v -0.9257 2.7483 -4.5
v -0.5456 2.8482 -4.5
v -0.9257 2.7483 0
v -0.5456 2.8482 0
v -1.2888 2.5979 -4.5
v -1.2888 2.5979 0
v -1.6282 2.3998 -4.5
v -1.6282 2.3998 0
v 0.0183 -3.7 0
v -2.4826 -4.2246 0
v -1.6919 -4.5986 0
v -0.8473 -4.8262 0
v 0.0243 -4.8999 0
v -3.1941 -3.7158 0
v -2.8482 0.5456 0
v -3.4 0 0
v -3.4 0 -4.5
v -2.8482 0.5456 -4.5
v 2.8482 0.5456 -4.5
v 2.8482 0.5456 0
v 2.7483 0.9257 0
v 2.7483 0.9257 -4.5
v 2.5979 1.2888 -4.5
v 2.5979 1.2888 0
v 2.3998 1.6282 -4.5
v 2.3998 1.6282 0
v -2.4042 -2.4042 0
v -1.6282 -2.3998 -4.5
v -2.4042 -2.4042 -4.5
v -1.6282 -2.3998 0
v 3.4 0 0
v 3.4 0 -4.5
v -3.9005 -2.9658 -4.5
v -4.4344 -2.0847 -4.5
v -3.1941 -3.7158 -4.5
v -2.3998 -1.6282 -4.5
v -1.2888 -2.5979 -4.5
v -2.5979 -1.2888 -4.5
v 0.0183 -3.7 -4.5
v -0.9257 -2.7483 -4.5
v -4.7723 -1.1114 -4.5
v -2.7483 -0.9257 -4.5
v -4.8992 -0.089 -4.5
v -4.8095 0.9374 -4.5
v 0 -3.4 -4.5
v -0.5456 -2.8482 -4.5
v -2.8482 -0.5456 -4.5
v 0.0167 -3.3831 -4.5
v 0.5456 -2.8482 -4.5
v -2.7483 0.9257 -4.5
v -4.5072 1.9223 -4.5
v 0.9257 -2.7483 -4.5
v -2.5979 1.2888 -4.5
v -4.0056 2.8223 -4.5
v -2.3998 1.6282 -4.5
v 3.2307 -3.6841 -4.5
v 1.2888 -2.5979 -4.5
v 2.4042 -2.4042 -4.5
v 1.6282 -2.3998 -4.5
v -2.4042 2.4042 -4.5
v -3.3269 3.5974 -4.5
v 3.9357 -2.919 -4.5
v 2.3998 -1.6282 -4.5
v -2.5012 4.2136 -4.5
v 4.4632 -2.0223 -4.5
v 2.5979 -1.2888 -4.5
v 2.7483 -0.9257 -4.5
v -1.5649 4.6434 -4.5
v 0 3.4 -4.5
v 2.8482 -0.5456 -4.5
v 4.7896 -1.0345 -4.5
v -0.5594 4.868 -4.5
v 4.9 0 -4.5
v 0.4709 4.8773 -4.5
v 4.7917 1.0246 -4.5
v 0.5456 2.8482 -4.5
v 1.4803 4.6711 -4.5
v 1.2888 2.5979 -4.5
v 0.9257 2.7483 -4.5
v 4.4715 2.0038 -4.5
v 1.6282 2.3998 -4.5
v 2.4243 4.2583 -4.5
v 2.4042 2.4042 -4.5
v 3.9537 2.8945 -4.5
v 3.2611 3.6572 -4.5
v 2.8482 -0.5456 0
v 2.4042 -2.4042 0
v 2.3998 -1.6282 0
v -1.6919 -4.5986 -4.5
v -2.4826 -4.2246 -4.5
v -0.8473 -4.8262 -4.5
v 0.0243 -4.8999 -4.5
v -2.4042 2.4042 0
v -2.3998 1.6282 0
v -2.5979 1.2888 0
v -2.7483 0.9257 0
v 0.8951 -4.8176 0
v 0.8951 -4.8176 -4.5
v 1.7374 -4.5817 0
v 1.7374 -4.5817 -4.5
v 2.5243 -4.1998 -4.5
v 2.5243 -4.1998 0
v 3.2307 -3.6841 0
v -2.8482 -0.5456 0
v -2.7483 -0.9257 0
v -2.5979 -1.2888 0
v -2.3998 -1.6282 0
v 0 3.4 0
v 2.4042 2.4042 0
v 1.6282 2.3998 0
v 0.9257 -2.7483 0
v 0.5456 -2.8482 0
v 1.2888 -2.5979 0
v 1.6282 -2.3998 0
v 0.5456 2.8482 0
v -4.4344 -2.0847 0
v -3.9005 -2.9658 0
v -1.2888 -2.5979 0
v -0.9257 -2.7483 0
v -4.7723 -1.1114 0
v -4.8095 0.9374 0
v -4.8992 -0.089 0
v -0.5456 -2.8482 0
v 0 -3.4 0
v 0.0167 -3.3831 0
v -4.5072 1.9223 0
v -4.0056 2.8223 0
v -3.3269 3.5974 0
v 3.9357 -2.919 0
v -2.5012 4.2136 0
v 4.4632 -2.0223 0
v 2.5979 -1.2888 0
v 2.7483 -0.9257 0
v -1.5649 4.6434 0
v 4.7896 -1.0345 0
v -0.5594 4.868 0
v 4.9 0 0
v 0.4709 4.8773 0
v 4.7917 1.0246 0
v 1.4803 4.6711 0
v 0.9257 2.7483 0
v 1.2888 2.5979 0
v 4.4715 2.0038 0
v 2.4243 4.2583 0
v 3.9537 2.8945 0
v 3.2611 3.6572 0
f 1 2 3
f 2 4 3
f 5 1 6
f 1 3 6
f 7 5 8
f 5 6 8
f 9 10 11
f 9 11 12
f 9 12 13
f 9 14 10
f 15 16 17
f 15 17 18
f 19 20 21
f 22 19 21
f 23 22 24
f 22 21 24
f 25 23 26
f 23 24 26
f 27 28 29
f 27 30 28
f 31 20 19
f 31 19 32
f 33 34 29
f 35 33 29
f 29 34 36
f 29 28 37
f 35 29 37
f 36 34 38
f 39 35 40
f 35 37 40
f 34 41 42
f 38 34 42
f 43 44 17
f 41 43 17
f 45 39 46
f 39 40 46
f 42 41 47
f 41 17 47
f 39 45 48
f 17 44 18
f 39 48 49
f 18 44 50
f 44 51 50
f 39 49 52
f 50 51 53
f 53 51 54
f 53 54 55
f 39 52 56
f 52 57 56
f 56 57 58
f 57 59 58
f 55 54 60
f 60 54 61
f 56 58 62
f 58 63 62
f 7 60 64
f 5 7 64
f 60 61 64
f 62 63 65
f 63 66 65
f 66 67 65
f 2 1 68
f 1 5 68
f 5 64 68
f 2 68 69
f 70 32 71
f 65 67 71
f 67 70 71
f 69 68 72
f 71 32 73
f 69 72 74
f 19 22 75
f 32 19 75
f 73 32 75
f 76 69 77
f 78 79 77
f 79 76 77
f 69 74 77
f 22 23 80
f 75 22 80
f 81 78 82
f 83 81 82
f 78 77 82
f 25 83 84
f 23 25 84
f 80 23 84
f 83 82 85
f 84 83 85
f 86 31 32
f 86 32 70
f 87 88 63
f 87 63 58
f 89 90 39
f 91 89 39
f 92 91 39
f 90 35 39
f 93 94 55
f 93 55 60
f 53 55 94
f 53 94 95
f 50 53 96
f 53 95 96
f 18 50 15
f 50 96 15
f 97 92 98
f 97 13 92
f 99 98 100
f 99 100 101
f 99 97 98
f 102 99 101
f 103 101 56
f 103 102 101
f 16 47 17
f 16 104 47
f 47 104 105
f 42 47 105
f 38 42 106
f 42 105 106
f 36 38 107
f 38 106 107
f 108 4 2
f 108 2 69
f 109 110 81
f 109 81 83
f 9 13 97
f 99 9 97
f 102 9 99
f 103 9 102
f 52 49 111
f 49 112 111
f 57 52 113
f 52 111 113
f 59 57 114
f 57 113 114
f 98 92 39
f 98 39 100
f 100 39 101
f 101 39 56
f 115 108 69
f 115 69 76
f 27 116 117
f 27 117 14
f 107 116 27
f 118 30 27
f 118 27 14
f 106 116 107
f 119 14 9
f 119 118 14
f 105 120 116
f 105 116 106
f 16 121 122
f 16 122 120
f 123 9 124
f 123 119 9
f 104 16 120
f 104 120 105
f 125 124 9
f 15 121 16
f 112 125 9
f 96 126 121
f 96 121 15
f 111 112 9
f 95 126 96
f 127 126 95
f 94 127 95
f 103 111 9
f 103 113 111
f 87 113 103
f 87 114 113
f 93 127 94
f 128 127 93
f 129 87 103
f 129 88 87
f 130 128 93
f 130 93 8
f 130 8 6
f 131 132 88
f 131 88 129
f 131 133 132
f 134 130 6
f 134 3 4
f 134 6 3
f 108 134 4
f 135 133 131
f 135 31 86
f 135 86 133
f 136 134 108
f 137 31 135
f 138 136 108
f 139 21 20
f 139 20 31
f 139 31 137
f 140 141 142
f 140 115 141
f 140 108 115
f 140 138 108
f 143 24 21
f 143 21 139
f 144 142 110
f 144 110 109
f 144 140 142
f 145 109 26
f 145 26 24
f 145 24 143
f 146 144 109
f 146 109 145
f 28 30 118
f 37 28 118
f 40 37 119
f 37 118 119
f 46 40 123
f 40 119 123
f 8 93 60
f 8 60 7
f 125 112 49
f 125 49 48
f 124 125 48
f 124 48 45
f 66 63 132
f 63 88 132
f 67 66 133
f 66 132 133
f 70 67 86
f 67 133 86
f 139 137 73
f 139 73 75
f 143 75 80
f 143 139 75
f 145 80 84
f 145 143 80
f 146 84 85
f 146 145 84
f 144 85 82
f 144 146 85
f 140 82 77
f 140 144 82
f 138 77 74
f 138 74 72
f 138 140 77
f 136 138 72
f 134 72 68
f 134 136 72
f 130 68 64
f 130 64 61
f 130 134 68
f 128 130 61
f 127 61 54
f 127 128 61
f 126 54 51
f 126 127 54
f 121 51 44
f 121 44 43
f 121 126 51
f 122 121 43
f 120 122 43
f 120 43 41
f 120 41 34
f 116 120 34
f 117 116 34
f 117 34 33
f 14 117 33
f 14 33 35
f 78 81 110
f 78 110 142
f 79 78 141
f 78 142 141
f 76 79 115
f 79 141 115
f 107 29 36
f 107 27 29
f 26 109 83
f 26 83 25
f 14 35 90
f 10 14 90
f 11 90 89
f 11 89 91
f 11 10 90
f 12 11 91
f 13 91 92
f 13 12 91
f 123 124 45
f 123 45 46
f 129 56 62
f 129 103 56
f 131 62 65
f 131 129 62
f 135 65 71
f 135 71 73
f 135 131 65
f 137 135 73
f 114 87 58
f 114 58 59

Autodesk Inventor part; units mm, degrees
ref_plane "YZ Plane" through (0, 0, 0) normal (1, 0, 0) x (0, 1, 0)
ref_plane "XZ Plane" through (0, 0, 0) normal (0, 1, 0) x (-1, 0, 0)
sketch "Sketch1" plane through (0, 0, 0) normal (0, 0, 1) x (1, 0, 0)
  line L0 (-2.3998, 1.6282) -> (-2.4042, 2.4042) projected
  arc A0 (-2.3998, 1.6282) -> (-2.8482, 0.5456) centre (0, 0) ccw projected
  line L1 (-3.4, 0) -> (-2.8482, 0.5456) projected
  line L2 (-2.8482, -0.5456) -> (-3.4, 0) projected
  arc A1 (-2.8482, -0.5456) -> (-2.3998, -1.6282) centre (0, 0) ccw projected
  line L3 (-2.4042, -2.4042) -> (-2.3998, -1.6282) projected
  line L4 (-1.6282, -2.3998) -> (-2.4042, -2.4042) projected
  arc A2 (-1.6282, -2.3998) -> (-0.5456, -2.8482) centre (0, 0) ccw projected
  line L5 (0, -3.4) -> (-0.5456, -2.8482) projected
  line L6 (0.5456, -2.8482) -> (0, -3.4) projected
  arc A3 (0.5456, -2.8482) -> (1.6282, -2.3998) centre (0, 0) ccw projected
  line L7 (2.4042, -2.4042) -> (1.6282, -2.3998) projected
  line L8 (2.3998, -1.6282) -> (2.4042, -2.4042) projected
  arc A4 (2.3998, -1.6282) -> (2.8482, -0.5456) centre (0, 0) ccw projected
  line L9 (3.4, 0) -> (2.8482, -0.5456) projected
  line L10 (2.8482, 0.5456) -> (3.4, 0) projected
  arc A5 (2.8482, 0.5456) -> (2.3998, 1.6282) centre (0, 0) ccw projected
  line L11 (2.4042, 2.4042) -> (2.3998, 1.6282) projected
  line L12 (1.6282, 2.3998) -> (2.4042, 2.4042) projected
  arc A6 (1.6282, 2.3998) -> (0.5456, 2.8482) centre (0, 0) ccw projected
  line L13 (0, 3.4) -> (0.5456, 2.8482) projected
  line L14 (-0.5456, 2.8482) -> (0, 3.4) projected
  arc A7 (-0.5456, 2.8482) -> (-1.6282, 2.3998) centre (0, 0) ccw projected
  line L15 (-2.4042, 2.4042) -> (-1.6282, 2.3998) projected
  circle A8 centre (0, 0) radius 1 projected
  circle A9 centre (0, 0) radius 2.9
  circle A10 centre (0, 0) radius 1.1 projected
  line L16 (-12.5394, 7.938) -> (-12.4815, -3.7618) projected
  line L17 (-12.4815, -3.7618) -> (12.5182, -3.6381) projected
  line L18 (12.5182, -3.6381) -> (12.4603, 8.0618) projected
  line L19 (12.4603, 8.0618) -> (-12.5394, 7.938) projected
  circle A11 centre (8.485, 3.042) radius 3 projected
  circle A12 centre (-8.5147, 2.9579) radius 3 projected
  line L20 (0, 0) -> (0.0183, -3.7)
  line L21 (0.0183, -3.7) -> (0.0243, -4.8999)
  circle A13 centre (0, 0) radius 4.9
  point P0 (0, 0)
  dimension "d0" = 1.2
ref_plane "Work Plane1" through (-3.4, -3.4, -4.5) normal (0, 0, -1) x (0, 1, 0)
extrude "Extrusion1" add sketch "Sketch1" against normal up to surface (4.5 mm away) contours L17 A13 | L17 A13 L21 | L21 A13 L17
properties part number "oponka"
